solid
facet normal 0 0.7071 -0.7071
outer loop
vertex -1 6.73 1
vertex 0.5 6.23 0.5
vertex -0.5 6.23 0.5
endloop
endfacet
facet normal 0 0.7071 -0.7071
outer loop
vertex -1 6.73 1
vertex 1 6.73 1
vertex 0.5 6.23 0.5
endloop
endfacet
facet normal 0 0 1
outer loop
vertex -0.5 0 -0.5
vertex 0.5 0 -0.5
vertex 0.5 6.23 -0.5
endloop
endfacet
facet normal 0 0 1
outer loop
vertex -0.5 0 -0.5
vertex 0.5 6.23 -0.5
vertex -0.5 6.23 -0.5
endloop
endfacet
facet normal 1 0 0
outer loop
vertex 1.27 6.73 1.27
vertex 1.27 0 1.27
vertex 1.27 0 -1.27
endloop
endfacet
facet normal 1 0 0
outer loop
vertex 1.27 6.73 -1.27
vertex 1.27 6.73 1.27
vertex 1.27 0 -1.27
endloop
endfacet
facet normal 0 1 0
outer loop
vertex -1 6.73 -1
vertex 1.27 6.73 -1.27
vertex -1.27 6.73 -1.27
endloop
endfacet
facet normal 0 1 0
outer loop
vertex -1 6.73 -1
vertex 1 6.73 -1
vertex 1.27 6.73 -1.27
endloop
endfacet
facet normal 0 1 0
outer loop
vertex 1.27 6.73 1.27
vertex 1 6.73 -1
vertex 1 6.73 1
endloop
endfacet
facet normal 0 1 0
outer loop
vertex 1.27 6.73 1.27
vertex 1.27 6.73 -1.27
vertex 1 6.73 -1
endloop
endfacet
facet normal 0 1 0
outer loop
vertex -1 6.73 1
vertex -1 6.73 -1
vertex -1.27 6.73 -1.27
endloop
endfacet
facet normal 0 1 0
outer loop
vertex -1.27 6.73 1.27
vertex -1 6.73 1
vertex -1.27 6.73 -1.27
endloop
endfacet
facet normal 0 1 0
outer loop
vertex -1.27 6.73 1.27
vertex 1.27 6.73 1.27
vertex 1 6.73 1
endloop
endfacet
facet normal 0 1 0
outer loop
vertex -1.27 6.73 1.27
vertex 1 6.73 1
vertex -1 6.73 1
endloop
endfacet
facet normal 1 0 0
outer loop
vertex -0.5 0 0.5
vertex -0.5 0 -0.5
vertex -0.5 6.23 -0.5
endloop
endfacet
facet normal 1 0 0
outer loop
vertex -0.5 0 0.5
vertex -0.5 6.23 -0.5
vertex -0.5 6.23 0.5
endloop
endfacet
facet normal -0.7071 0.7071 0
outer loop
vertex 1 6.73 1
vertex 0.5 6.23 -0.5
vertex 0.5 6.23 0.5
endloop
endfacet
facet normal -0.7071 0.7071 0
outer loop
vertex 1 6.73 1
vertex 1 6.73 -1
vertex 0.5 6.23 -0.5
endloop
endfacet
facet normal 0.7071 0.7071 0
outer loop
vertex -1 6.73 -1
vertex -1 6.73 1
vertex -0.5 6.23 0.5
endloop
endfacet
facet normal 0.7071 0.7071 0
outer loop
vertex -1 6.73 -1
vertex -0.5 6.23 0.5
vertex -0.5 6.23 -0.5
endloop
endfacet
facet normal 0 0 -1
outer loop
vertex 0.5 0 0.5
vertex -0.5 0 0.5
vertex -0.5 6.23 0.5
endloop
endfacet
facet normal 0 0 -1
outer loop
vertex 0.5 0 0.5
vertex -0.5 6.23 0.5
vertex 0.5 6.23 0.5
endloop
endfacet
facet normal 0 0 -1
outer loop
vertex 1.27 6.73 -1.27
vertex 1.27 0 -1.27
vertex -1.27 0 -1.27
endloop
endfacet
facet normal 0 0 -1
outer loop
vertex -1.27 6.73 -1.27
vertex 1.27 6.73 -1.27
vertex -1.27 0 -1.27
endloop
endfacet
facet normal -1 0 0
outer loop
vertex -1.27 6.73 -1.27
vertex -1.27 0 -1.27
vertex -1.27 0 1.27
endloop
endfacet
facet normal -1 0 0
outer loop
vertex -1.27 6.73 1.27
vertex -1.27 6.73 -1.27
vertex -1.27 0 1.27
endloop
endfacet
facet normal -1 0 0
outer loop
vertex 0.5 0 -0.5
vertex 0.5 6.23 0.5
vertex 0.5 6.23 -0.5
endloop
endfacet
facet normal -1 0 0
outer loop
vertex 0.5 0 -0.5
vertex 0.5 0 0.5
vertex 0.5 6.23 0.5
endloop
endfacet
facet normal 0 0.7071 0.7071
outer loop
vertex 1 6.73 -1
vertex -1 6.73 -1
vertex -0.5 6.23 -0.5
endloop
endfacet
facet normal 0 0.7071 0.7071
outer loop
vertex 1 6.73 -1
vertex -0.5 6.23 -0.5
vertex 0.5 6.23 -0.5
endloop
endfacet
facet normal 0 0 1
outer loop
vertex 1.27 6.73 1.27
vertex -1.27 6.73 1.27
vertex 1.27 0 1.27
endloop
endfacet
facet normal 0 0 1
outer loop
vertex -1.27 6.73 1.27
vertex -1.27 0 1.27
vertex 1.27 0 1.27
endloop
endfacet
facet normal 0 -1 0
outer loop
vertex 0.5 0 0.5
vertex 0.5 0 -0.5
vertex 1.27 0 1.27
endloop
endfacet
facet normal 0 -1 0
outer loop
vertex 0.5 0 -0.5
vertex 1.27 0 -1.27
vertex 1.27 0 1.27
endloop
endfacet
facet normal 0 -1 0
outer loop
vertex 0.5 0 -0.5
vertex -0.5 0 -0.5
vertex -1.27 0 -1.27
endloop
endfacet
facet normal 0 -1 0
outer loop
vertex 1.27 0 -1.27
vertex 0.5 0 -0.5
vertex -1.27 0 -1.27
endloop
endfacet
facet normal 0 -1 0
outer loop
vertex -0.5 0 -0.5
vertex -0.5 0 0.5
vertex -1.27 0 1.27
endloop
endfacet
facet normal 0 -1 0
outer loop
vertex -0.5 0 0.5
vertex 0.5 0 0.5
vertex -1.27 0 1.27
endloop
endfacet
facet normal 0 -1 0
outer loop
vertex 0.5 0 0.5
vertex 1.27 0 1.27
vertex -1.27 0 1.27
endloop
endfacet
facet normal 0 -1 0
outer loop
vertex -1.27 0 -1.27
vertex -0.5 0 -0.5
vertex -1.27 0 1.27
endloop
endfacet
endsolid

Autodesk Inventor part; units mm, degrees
ref_plane "YZ Plane" through (0, 0, 0) normal (1, 0, 0) x (0, 1, 0)
ref_plane "XZ Plane" through (0, 0, 0) normal (0, 1, 0) x (-1, 0, 0)
ref_plane "XY Plane" through (0, 0, 0) normal (0, 0, 1) x (1, 0, 0)
sketch "Sketch1" plane through (0, 0, 0) normal (0, 1, 0) x (-1, 0, 0)
  line L0 (1.27, 1.27) -> (-1.27, 1.27)
  line L1 (-1.27, 1.27) -> (-1.27, -1.27)
  line L2 (-1.27, -1.27) -> (1.27, -1.27)
  line L3 (1.27, -1.27) -> (1.27, 1.27)
  line L4 (1.27, 1.27) -> (-1.27, -1.27) construction
  line L5 (-1.27, 1.27) -> (1.27, -1.27) construction
  line L6 (0.5, 0.5) -> (-0.5, 0.5)
  line L7 (-0.5, 0.5) -> (-0.5, -0.5)
  line L8 (-0.5, -0.5) -> (0.5, -0.5)
  line L9 (0.5, -0.5) -> (0.5, 0.5)
  line L10 (0.5, 0.5) -> (-0.5, -0.5) construction
  line L11 (-0.5, 0.5) -> (0.5, -0.5) construction
  point P0 (0, 0)
  dimension "d0" = 2.54
  dimension "d1" = 2.54
  dimension "d2" = 1
  dimension "d3" = 1
extrude "Extrusion1" add sketch "Sketch1" along normal blind 6.73
chamfer "Chamfer1" distance 0.5 angle 45 4 edges at (-0.5, 6.73, 0) (0, 6.73, -0.5) (0.5, 6.73, 0) (0, 6.73, 0.5)
properties part number "pinShroud" material "ABS Plastic"
